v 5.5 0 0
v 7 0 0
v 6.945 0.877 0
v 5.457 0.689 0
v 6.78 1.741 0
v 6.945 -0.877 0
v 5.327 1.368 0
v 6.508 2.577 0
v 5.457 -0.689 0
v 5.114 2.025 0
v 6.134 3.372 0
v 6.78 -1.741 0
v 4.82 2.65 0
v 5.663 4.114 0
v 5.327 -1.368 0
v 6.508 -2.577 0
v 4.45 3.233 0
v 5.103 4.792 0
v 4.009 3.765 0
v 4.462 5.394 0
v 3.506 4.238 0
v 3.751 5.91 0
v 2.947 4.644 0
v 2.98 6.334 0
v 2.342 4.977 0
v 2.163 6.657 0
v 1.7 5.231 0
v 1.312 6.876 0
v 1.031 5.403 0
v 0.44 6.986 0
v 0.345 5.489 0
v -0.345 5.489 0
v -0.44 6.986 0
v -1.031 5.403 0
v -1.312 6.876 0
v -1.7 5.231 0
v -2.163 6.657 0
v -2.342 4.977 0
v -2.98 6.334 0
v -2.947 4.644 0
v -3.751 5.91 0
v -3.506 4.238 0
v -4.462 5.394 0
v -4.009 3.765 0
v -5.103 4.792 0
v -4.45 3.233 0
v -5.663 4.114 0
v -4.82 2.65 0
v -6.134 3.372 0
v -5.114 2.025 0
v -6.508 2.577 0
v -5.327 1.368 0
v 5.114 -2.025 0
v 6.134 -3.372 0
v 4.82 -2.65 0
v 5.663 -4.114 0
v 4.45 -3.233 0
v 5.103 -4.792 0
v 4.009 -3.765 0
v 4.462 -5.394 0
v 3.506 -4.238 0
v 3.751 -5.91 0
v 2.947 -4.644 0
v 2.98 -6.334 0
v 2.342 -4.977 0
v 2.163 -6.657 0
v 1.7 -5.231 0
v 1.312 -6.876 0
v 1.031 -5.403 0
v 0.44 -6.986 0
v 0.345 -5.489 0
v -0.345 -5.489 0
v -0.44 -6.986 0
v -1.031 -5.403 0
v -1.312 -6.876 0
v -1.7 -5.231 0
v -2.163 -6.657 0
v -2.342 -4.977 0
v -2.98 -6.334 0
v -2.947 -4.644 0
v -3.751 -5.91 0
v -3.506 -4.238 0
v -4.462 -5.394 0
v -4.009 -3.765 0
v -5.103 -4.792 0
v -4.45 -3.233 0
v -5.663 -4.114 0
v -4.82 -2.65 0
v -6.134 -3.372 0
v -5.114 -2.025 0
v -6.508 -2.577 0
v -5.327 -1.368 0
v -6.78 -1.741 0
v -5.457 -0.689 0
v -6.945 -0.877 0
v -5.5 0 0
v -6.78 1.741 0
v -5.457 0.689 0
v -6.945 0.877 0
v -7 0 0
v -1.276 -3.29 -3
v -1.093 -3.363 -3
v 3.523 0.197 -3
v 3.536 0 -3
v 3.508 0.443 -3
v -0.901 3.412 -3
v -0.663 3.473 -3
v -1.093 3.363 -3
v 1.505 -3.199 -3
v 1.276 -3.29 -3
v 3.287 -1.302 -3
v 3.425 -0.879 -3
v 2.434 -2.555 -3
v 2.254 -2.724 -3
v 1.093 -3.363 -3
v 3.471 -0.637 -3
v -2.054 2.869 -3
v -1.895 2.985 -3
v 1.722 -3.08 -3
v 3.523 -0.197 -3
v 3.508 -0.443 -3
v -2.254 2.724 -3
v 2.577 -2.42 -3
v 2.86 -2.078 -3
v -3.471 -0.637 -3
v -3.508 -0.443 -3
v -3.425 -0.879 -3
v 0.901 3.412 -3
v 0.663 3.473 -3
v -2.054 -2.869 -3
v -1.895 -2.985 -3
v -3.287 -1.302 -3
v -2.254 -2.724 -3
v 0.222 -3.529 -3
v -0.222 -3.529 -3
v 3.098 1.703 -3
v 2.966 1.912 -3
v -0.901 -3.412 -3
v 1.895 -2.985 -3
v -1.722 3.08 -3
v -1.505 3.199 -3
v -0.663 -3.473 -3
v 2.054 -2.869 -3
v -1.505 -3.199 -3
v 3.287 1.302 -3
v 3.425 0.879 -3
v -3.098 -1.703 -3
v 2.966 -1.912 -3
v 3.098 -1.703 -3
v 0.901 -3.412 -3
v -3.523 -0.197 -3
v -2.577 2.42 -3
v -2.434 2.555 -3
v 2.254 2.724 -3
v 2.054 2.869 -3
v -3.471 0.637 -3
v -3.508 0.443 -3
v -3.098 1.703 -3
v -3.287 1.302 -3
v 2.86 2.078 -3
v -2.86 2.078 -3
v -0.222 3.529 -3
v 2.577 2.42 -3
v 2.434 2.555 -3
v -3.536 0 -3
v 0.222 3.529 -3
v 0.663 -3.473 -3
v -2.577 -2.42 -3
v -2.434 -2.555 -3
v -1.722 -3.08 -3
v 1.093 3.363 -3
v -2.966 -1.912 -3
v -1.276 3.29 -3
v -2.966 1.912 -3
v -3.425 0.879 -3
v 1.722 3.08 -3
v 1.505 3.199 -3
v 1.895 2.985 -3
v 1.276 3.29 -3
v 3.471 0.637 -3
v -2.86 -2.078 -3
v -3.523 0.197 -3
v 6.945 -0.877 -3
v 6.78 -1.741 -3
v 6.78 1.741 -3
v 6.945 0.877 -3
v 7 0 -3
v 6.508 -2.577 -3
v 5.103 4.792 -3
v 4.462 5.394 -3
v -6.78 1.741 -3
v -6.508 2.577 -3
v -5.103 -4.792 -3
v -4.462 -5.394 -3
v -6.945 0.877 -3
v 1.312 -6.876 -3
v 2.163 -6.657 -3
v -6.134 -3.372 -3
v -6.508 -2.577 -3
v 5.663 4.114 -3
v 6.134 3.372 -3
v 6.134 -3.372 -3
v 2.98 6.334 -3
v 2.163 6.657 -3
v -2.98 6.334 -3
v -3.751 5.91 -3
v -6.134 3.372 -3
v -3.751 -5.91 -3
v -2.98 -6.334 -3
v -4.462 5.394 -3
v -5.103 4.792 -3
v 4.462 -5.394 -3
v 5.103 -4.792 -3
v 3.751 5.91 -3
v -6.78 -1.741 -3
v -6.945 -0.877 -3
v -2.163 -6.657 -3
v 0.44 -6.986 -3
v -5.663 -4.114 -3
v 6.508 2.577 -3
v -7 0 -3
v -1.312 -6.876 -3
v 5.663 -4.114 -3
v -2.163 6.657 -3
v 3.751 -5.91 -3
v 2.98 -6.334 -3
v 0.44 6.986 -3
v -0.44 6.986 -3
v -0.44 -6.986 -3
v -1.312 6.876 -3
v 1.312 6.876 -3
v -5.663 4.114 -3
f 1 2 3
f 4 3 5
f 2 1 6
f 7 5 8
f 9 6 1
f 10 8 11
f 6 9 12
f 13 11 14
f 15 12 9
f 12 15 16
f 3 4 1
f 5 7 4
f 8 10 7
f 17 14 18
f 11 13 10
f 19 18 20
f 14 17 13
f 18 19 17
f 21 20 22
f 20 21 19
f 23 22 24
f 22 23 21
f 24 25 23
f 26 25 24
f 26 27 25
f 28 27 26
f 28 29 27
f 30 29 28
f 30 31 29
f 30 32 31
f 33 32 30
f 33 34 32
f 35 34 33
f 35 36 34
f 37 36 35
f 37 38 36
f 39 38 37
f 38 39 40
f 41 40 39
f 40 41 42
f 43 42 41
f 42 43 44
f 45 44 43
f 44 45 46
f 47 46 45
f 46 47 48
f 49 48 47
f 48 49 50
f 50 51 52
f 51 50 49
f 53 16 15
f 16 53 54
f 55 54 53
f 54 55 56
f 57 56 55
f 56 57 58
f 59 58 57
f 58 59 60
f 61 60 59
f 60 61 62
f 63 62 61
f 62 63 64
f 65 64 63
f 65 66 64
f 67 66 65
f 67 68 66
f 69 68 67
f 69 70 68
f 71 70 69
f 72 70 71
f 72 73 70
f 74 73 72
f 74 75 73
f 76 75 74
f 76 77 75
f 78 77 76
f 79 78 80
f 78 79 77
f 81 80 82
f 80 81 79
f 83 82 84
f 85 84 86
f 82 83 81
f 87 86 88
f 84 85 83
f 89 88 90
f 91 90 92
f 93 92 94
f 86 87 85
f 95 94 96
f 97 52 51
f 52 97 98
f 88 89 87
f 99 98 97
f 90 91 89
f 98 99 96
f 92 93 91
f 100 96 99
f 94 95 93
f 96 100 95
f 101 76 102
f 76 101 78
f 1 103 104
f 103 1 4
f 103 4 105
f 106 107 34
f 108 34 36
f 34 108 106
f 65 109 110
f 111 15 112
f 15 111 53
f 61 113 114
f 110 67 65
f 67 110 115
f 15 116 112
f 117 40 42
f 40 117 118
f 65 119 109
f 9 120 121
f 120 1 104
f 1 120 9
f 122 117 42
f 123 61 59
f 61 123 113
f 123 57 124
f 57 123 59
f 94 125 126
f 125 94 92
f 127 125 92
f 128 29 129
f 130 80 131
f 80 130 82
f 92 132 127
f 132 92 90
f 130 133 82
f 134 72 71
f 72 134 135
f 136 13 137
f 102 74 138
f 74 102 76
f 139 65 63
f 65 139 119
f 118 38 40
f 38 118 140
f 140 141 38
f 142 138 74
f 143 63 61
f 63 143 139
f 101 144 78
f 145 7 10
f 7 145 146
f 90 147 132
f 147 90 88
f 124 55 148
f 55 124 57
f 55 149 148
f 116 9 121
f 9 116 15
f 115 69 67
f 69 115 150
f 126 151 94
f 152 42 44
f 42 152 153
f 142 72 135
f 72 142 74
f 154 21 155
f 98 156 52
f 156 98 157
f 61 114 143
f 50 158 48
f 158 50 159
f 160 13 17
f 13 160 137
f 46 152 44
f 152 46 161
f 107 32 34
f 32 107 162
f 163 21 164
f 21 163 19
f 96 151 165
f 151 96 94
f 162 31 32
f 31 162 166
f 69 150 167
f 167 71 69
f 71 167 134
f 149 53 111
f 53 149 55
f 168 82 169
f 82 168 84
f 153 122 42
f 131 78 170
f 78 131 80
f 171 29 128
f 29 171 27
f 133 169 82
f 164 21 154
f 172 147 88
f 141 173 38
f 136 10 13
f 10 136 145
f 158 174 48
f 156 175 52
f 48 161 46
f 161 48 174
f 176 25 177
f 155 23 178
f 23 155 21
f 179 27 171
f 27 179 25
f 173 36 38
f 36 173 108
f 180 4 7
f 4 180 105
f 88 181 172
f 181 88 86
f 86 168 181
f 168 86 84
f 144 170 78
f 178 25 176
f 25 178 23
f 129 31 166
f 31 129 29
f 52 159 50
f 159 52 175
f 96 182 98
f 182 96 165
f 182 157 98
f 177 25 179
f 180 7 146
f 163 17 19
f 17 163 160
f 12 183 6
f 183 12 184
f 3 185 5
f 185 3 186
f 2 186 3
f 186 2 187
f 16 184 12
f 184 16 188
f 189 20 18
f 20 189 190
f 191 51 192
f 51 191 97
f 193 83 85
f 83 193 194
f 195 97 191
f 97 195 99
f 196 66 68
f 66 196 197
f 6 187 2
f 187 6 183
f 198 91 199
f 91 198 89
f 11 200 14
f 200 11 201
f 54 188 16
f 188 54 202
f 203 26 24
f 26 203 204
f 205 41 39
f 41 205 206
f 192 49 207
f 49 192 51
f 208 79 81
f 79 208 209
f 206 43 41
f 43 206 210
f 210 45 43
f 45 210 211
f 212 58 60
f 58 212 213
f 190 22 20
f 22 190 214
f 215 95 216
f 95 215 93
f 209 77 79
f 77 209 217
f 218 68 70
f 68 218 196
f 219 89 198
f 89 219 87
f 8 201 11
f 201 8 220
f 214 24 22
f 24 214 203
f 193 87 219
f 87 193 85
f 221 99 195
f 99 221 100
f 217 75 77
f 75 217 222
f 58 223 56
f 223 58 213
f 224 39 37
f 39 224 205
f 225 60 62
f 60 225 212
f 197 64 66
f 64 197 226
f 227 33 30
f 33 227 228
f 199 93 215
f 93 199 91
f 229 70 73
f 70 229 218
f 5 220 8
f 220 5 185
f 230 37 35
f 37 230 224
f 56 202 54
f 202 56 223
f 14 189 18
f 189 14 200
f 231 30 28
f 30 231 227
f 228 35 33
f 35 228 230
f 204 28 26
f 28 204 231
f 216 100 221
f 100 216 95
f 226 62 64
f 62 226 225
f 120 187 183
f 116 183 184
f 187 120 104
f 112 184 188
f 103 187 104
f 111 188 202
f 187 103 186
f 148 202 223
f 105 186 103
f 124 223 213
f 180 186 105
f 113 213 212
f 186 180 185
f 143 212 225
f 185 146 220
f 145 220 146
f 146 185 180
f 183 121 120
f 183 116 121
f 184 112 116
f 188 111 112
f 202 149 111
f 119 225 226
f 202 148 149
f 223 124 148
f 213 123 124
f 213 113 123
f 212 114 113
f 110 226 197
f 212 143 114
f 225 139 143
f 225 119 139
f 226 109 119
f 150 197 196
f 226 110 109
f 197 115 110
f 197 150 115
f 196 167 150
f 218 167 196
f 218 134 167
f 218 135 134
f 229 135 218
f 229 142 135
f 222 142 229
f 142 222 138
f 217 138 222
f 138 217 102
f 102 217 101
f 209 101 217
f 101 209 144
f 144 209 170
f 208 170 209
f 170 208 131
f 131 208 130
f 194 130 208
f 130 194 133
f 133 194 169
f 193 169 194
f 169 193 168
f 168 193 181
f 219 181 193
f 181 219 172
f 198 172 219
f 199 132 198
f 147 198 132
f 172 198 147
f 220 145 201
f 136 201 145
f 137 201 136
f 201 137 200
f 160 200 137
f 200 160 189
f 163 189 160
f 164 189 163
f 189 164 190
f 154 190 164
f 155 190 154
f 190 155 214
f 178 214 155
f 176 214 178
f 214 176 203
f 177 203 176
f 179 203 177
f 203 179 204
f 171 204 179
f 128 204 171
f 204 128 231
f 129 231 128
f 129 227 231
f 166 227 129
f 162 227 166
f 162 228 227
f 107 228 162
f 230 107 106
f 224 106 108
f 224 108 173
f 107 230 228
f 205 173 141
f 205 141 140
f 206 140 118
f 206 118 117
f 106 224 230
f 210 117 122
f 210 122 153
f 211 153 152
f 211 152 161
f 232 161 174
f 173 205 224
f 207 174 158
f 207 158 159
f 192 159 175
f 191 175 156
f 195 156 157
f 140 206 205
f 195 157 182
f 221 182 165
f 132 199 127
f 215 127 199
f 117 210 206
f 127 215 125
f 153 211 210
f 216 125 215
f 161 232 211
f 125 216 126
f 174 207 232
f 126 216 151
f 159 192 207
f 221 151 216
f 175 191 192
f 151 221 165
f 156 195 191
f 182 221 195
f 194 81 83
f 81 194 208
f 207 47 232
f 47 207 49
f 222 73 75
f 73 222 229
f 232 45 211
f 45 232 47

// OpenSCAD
$fn = 50;


difference() {
	union() {
		translate(v = [0, 0, -3.0000000000]) {
			cylinder(h = 3, r = 7.0000000000);
		}
		cylinder(h = 0, r = 17.0000000000);
	}
	union() {
		translate(v = [0, 0, 0]) {
			rotate(a = [0, 0, 0]) {
				difference() {
					union() {
						#translate(v = [0, 0, -3.0000000000]) {
							cylinder(h = 3, r = 2.2500000000);
						}
						#translate(v = [0, 0, -4.2000000000]) {
							cylinder(h = 4.2000000000, r = 7.0000000000, r1 = 2.7500000000, r2 = 5.5000000000);
						}
						#translate(v = [0, 0, -3.0000000000]) {
							cylinder(h = 3, r = 2.7500000000);
						}
						#translate(v = [0, 0, -3.0000000000]) {
							cylinder(h = 3, r = 2.2500000000);
						}
					}
					union();
				}
			}
		}
	}
}
